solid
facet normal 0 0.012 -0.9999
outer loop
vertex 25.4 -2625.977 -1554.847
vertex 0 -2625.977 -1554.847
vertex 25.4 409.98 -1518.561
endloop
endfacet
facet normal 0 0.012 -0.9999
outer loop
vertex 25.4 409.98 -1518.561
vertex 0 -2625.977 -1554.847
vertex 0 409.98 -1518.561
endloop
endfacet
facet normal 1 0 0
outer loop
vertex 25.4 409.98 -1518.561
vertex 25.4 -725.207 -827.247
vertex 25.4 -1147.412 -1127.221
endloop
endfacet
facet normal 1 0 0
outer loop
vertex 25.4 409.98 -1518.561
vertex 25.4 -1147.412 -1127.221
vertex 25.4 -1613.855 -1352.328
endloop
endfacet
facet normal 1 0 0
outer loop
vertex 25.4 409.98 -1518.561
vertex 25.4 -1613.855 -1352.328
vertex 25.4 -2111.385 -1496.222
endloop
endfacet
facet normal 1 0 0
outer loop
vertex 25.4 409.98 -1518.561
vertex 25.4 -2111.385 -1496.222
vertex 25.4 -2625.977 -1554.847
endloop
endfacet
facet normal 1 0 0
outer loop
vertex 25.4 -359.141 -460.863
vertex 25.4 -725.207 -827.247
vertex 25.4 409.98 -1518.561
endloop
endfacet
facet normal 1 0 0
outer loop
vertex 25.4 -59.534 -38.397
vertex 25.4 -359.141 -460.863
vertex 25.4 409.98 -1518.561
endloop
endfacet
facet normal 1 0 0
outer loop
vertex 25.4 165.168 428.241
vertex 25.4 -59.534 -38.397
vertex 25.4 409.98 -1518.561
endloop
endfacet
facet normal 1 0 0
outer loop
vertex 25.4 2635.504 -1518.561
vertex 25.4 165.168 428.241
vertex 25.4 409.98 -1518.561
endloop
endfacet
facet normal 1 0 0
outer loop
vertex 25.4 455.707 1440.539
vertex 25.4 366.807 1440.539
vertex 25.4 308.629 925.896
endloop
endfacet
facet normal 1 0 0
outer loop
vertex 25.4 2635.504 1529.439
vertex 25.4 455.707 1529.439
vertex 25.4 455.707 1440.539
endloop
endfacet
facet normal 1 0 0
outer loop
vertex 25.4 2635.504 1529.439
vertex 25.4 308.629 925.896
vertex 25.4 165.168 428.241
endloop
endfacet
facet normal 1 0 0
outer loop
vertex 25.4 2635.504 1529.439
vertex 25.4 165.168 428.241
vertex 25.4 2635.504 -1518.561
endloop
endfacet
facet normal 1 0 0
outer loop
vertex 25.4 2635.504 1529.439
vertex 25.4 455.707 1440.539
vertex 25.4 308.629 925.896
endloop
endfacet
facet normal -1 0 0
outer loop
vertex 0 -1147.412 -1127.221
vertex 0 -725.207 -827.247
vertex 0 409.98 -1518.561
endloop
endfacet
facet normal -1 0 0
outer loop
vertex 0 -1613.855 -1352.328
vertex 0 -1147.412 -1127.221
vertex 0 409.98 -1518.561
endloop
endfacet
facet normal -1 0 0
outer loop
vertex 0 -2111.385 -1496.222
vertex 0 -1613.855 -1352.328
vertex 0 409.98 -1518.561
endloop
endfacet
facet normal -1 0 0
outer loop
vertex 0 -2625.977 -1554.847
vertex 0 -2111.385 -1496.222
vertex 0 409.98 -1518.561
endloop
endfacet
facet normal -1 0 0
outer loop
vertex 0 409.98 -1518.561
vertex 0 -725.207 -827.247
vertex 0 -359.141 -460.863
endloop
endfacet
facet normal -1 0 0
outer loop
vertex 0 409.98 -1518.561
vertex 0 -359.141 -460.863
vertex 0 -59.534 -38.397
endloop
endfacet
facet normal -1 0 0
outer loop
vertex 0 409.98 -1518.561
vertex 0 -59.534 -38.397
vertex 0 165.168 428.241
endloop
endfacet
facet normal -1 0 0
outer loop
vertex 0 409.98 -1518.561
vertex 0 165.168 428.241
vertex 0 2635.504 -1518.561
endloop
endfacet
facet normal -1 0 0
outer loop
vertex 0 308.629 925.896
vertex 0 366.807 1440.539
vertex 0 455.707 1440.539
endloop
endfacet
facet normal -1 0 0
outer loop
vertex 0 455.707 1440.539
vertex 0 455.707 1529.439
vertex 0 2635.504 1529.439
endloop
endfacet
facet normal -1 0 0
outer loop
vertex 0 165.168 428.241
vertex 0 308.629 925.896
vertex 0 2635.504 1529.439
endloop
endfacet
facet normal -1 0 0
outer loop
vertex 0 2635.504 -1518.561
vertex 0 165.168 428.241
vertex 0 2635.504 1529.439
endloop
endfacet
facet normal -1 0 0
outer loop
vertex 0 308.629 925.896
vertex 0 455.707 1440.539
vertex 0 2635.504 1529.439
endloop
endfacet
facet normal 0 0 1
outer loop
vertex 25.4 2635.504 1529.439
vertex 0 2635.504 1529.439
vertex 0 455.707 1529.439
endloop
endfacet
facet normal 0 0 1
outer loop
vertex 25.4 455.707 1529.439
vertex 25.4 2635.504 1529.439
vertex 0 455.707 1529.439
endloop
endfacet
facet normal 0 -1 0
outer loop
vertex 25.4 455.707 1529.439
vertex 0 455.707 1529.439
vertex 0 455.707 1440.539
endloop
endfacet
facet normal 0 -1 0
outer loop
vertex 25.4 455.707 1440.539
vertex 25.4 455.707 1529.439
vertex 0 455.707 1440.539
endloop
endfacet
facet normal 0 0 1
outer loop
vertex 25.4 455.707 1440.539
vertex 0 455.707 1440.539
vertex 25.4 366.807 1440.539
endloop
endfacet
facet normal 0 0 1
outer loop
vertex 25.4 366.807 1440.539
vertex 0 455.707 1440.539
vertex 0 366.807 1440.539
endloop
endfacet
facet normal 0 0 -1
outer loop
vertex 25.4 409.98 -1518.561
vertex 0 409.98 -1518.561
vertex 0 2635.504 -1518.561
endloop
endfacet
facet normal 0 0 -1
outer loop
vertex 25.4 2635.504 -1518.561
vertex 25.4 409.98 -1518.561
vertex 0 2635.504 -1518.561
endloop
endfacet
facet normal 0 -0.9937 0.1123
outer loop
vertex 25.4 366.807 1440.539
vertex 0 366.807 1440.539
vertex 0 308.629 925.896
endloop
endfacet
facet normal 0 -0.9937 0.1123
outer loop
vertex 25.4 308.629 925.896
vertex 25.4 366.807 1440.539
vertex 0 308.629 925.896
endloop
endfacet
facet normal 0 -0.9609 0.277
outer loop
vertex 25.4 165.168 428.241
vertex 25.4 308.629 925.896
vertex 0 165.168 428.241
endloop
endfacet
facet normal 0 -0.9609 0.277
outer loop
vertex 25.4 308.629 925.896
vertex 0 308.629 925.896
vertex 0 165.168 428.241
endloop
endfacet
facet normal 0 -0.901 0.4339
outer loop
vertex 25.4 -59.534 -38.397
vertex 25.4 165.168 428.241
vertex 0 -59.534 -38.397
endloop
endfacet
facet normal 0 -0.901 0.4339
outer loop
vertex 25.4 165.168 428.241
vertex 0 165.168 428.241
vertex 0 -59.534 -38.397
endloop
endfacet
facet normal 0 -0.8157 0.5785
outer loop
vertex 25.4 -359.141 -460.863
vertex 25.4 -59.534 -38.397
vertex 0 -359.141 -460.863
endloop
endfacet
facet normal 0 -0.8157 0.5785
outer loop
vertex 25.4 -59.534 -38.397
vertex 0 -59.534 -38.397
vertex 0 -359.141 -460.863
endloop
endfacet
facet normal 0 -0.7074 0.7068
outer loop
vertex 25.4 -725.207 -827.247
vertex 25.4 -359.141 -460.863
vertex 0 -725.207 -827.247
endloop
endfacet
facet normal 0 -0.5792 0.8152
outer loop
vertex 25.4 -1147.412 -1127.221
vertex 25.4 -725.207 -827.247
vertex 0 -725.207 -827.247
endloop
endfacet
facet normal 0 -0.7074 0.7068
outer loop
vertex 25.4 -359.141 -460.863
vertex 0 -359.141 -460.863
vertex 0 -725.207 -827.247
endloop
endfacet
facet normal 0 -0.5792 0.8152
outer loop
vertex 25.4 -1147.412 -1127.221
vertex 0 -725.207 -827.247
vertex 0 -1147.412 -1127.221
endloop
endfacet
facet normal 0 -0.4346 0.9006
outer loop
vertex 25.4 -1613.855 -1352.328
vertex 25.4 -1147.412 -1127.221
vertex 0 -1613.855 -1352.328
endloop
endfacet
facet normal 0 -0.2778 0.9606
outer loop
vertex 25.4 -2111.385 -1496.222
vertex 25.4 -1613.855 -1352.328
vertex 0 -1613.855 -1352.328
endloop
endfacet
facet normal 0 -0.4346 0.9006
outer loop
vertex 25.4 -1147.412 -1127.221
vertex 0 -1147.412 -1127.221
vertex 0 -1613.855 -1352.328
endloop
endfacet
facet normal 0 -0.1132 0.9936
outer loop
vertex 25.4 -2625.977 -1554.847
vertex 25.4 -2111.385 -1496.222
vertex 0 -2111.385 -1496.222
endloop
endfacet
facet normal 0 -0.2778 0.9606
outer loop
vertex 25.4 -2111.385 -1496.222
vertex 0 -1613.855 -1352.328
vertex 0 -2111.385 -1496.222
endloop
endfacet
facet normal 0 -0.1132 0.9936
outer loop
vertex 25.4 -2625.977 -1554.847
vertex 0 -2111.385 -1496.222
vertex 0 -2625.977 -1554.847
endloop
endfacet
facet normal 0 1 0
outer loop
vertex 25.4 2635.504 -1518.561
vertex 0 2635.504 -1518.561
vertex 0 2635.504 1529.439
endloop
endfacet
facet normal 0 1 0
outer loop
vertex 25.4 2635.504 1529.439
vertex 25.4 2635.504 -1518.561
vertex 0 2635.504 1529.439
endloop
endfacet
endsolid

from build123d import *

# Parameters (mm, degrees)
F1_DEPTH = 25.4


with BuildPart() as f1:
    # F0 (on Right) → F1 (new body)
    with BuildSketch(Plane.YZ):
        with BuildLine():
            Line((2635.504189, 1529.438918), (455.706796, 1529.438918))
            Line((455.706796, 1529.438918), (455.706796, 1440.538918))
            Line((455.706796, 1440.538918), (366.806796, 1440.538918))
            ThreePointArc((366.806796, 1440.538918), (-534.470679, -651.751629), (-2625.977351, -1554.846674))
            Line((-2625.977351, -1554.846674), (409.98043, -1518.561082))
            Line((409.98043, -1518.561082), (2635.504189, -1518.561082))
            Line((2635.504189, -1518.561082), (2635.504189, 1529.438918))
        make_face()
    extrude(amount=F1_DEPTH)


solid = f1.part
